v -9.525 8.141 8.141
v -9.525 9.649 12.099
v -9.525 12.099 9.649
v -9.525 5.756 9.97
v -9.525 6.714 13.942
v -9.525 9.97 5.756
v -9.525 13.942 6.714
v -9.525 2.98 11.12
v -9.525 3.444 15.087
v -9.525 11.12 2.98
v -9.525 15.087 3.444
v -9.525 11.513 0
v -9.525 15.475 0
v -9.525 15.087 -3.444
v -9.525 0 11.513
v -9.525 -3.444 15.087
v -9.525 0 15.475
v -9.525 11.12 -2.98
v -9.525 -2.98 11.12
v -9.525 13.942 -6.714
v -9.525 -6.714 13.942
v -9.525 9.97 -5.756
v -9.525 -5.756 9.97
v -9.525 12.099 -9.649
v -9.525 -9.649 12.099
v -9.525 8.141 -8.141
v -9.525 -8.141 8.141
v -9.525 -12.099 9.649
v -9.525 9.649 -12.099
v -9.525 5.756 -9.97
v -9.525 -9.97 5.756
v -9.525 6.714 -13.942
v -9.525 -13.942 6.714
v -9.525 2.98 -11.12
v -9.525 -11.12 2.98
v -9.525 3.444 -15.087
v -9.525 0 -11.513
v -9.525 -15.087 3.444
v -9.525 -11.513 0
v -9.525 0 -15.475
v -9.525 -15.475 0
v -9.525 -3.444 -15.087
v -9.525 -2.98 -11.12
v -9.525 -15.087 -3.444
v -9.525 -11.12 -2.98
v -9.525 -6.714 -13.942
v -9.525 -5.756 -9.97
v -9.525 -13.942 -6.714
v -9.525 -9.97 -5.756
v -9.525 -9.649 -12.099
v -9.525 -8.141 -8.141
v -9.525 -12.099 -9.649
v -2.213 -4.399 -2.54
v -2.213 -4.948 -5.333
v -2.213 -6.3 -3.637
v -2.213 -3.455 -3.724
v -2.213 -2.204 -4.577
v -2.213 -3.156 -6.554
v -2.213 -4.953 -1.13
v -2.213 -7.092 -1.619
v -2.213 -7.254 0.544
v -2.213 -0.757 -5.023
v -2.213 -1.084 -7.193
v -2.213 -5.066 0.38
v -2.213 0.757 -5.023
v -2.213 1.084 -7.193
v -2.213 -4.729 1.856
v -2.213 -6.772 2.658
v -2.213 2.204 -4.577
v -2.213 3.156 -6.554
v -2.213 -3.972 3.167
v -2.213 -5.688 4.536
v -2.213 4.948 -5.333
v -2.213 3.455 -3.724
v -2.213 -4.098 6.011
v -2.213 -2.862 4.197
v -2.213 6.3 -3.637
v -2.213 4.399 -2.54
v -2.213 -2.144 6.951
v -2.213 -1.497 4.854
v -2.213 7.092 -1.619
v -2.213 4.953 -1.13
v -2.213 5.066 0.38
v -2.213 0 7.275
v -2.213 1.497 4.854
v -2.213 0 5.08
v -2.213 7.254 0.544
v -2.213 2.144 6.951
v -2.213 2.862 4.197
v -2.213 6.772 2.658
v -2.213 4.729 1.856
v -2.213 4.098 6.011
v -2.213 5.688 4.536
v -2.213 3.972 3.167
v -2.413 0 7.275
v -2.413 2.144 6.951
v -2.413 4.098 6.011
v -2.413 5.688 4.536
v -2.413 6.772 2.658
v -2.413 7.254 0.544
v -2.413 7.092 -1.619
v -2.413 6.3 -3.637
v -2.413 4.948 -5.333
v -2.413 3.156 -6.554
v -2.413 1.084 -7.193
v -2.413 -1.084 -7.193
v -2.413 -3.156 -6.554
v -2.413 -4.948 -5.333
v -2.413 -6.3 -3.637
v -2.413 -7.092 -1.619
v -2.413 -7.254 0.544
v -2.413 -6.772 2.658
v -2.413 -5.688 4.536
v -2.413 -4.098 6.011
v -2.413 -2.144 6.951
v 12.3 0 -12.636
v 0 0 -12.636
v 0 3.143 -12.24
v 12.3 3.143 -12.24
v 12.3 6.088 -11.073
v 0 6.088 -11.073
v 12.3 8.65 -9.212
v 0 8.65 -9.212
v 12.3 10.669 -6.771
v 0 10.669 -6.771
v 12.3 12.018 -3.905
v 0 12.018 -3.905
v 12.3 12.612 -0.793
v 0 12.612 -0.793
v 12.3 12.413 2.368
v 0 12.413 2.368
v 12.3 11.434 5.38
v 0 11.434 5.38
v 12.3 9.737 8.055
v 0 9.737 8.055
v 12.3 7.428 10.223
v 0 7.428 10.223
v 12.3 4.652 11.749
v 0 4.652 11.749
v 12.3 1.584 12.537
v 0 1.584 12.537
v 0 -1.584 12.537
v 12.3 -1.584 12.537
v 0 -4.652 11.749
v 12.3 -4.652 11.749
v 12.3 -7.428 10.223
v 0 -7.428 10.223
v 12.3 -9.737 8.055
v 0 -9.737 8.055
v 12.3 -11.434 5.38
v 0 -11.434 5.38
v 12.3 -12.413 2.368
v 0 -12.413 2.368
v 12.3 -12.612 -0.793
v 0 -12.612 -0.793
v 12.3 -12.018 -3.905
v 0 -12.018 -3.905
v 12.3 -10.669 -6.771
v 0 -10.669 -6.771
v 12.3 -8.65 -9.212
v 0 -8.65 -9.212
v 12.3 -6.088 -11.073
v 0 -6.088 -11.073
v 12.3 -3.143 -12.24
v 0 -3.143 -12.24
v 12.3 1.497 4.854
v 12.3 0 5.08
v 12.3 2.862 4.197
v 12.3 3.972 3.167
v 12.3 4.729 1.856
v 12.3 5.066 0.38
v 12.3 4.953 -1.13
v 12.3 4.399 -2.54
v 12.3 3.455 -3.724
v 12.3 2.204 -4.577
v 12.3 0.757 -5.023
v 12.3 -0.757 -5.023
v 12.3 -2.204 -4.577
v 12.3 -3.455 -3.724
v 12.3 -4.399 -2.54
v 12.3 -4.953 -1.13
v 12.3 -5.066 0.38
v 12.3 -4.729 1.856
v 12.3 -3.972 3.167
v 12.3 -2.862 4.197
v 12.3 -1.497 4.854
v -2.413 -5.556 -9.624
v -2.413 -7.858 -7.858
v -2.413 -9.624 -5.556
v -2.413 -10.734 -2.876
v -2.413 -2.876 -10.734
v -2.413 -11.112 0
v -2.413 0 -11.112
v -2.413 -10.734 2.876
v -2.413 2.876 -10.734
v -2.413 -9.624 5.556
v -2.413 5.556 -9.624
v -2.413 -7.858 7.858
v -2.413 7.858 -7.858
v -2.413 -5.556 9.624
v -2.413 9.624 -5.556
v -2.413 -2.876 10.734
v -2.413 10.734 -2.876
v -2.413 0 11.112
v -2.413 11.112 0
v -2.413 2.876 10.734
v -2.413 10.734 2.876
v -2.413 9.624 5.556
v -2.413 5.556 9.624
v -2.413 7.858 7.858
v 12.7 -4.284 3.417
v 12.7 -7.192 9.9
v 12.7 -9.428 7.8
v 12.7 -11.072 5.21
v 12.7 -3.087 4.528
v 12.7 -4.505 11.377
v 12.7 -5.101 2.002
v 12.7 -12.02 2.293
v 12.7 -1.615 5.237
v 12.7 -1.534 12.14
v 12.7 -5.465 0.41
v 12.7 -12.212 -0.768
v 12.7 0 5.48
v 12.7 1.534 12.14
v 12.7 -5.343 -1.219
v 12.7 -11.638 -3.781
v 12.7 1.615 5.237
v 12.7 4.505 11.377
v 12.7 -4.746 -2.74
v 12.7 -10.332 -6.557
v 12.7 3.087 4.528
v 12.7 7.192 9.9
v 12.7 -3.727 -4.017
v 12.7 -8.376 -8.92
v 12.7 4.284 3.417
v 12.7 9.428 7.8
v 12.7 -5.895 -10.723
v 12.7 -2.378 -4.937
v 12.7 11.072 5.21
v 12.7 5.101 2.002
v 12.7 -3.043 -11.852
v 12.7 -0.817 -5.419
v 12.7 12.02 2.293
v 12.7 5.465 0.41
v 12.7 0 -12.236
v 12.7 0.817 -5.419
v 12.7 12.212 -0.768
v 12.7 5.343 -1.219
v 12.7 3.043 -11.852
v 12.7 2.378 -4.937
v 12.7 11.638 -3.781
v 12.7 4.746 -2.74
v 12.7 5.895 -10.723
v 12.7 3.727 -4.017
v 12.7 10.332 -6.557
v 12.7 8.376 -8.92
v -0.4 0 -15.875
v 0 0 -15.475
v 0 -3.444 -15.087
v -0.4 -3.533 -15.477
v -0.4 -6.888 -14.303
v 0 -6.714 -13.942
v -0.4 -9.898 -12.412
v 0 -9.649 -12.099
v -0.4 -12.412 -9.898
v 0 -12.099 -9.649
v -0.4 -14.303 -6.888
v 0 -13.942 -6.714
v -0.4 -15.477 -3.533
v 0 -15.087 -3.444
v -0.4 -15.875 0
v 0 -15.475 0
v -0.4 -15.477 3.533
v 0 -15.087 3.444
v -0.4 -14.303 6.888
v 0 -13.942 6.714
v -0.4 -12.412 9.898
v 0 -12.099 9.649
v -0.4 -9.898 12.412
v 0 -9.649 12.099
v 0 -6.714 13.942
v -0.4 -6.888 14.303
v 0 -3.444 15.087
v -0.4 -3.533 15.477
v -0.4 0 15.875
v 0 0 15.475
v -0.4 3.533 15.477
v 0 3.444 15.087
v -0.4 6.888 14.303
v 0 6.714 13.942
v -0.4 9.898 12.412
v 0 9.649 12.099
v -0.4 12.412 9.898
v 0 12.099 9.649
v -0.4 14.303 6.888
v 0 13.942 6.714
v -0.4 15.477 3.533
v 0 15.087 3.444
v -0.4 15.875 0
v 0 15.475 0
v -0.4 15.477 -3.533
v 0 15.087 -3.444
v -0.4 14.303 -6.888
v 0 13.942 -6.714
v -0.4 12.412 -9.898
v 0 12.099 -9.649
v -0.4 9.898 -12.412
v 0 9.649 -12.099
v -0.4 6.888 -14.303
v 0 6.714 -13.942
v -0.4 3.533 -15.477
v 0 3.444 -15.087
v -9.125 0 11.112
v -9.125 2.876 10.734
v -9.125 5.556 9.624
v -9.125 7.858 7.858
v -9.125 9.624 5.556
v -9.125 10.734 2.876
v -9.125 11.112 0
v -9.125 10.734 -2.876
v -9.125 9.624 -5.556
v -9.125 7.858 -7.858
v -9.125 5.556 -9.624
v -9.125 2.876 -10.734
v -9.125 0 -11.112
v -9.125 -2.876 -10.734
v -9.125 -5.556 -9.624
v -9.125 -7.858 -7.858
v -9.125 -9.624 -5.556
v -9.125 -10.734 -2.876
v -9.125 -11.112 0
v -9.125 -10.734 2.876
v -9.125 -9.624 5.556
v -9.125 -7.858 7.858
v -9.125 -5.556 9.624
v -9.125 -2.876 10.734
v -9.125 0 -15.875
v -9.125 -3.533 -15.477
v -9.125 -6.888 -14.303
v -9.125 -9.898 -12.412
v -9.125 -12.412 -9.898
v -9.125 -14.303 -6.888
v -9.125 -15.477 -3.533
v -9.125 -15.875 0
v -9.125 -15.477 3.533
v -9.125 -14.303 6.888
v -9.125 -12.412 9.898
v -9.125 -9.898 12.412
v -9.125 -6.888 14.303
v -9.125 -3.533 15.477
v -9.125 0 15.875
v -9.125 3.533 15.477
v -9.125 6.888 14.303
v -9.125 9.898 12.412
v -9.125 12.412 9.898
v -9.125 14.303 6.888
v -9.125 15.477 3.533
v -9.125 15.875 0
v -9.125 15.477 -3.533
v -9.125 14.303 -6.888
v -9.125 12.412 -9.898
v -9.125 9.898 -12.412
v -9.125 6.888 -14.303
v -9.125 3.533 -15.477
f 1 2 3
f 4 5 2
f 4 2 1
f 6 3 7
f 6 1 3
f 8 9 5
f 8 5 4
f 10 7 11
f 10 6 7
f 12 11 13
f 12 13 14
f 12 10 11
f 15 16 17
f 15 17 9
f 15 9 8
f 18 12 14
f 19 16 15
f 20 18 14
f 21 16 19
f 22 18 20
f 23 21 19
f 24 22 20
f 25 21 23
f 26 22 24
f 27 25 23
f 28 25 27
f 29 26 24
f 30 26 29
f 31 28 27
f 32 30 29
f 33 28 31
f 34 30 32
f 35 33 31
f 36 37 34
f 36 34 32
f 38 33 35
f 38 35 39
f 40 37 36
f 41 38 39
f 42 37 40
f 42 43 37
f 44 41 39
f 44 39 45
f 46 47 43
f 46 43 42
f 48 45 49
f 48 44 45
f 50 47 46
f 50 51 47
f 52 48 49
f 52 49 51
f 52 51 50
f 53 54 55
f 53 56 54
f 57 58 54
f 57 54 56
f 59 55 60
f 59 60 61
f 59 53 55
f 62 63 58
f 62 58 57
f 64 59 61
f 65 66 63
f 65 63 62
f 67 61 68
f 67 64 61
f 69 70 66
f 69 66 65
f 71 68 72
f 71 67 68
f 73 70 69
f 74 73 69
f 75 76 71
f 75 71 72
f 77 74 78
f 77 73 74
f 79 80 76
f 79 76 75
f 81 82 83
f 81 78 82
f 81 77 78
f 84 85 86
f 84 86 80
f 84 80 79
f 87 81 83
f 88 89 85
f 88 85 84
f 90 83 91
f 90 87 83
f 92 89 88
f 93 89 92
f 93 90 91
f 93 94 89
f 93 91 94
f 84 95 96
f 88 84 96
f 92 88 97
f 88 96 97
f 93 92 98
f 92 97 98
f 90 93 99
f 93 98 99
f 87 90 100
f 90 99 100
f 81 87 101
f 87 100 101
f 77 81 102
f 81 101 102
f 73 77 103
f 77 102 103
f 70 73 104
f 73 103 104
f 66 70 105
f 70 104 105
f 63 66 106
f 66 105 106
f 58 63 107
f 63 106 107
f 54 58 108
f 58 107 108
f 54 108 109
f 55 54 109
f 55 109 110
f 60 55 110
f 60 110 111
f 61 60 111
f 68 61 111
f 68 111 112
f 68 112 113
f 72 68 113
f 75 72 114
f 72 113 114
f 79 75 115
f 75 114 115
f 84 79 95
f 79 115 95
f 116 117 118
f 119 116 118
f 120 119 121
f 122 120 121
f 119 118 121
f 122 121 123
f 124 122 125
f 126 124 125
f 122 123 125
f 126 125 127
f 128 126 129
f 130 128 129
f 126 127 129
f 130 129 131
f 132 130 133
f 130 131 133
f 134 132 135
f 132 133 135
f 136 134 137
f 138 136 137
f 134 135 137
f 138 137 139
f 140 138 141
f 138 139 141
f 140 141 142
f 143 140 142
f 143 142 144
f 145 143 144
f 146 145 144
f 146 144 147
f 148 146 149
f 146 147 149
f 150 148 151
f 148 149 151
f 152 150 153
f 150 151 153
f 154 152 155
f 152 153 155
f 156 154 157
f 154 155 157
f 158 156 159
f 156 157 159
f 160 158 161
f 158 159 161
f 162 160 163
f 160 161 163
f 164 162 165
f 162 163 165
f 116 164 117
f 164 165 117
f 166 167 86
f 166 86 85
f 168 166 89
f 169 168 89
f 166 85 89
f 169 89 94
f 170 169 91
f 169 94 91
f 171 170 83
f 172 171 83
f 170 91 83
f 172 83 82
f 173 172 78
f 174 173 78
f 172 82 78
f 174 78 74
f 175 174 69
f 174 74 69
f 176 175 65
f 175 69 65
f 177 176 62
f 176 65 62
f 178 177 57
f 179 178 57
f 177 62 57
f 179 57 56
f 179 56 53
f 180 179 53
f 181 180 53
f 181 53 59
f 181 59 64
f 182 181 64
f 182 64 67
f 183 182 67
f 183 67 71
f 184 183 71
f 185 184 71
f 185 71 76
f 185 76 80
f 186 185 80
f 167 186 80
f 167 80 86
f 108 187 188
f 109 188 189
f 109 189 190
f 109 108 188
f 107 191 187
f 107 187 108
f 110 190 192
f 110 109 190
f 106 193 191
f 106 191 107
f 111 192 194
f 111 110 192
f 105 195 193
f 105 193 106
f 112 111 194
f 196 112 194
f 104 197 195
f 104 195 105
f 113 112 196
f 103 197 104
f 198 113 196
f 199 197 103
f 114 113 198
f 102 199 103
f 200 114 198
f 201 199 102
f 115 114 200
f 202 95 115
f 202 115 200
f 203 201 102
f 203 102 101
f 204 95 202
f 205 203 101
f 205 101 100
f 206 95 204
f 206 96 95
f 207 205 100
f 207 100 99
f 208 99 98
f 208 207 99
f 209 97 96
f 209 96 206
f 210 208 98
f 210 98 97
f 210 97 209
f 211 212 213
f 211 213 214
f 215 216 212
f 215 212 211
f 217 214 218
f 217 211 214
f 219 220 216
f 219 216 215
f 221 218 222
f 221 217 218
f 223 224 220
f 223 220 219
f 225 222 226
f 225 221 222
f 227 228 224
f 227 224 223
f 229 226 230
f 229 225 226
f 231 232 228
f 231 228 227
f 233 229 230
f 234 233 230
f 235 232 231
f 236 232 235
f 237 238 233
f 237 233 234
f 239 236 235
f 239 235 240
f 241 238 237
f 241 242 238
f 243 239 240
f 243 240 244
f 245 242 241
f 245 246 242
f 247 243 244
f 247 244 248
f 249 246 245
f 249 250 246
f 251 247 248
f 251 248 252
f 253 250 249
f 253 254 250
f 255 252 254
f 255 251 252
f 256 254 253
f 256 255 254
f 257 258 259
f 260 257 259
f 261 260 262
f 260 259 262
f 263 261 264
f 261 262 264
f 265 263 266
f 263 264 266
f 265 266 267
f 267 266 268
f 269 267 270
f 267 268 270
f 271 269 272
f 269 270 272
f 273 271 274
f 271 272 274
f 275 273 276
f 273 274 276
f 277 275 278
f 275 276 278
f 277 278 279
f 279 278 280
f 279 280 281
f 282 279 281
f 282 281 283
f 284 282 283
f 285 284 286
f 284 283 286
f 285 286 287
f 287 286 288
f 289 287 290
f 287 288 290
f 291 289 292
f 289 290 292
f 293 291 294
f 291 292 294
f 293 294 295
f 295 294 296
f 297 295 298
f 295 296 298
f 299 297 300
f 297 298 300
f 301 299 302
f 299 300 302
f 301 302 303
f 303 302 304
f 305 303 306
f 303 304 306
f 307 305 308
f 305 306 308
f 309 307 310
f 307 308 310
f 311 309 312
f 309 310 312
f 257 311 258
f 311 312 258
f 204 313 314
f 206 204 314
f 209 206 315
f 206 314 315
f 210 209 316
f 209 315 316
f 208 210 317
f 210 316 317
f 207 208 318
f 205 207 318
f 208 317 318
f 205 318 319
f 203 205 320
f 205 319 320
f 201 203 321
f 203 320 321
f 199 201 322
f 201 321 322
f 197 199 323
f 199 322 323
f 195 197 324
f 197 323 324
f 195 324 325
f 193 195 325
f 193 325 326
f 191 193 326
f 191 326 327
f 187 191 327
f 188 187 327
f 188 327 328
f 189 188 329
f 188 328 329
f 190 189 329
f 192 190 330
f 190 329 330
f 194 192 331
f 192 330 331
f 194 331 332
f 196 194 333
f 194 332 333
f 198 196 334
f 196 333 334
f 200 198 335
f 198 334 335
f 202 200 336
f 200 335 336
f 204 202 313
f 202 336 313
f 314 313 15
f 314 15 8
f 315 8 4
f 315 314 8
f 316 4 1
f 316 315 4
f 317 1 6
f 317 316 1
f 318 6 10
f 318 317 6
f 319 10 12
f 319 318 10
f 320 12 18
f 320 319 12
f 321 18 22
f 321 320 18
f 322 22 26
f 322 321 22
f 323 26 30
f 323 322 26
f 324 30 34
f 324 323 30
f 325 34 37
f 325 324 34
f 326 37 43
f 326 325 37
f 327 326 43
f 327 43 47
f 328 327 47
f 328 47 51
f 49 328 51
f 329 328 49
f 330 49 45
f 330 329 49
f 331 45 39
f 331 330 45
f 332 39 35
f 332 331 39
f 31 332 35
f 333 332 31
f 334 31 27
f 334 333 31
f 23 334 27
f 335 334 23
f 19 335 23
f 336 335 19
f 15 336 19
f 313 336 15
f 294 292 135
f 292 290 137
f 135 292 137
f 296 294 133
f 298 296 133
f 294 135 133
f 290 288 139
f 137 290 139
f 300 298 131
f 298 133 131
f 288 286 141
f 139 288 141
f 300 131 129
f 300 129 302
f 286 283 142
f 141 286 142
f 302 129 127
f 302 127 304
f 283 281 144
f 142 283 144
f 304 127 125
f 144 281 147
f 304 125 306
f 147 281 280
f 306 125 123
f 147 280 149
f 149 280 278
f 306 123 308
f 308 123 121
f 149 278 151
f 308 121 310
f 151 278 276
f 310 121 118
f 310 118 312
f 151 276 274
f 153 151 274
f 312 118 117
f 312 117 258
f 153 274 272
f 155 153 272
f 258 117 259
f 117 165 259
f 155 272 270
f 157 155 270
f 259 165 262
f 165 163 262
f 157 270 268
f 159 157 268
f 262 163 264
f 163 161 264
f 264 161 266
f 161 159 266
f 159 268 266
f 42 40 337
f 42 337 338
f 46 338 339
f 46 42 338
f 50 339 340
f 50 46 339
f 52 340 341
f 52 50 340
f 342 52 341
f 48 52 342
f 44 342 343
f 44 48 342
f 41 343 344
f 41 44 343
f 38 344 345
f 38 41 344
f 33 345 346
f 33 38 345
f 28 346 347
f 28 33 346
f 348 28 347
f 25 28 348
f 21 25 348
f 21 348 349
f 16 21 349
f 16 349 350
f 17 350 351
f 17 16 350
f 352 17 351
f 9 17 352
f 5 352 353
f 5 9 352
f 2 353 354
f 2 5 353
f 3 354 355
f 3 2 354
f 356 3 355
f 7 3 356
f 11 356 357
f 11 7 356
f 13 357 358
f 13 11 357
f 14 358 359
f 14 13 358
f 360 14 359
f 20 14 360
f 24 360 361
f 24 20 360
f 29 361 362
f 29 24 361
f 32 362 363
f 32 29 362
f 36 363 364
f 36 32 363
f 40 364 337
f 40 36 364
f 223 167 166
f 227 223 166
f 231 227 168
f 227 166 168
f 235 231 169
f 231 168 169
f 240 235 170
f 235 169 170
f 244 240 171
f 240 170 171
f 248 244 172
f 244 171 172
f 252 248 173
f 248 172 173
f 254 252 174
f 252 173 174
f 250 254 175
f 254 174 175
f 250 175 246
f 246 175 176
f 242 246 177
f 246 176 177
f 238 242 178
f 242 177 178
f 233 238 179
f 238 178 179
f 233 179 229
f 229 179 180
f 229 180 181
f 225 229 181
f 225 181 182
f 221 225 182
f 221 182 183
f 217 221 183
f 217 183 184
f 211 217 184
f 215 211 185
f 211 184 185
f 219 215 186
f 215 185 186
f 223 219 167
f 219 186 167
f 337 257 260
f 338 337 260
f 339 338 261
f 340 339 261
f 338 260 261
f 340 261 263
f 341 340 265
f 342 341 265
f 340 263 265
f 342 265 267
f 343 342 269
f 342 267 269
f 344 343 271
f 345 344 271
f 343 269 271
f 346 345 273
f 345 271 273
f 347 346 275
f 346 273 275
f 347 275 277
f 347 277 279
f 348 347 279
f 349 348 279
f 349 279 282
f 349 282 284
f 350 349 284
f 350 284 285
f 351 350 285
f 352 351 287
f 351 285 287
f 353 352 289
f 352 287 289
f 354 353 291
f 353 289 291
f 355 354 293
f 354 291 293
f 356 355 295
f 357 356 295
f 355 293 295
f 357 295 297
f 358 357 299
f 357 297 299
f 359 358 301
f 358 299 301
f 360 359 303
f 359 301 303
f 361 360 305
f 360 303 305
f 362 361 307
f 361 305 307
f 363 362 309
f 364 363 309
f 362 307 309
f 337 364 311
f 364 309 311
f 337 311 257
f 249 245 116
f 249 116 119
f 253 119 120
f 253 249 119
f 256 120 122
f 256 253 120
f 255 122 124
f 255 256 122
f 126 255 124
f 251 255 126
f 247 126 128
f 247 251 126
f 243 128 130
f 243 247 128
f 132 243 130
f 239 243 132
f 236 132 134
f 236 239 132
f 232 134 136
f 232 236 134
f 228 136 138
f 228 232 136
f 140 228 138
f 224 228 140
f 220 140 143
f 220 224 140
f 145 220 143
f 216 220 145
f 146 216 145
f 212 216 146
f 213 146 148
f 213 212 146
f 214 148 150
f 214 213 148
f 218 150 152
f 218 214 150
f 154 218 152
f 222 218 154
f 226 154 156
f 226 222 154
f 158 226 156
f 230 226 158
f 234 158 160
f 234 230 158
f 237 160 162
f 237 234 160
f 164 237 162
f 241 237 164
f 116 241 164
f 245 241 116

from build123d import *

# Parameters (mm, degrees)
SKETCH1_R           = 12.6365
BOSS_EXTRUDE1_DEPTH = 12.7
SKETCH2_R           = 15.875
BOSS_EXTRUDE2_DEPTH = 9.525
SKETCH3_R           = 11.1125
CUT_EXTRUDE1_DEPTH  = 7.112
SKETCH4_R           = 7.27458794
CUT_EXTRUDE2_DEPTH  = 0.2
SKETCH5_R           = 5.08
CUT_EXTRUDE3_DEPTH  = 27.952343479
CHAMFER1_SIZE       = 0.4


with BuildPart() as part:
    # Sketch1 → Boss-Extrude1 (new body)
    with BuildSketch(Plane(origin=(0, 0, 0), x_dir=(0, 0, -1), z_dir=(1, 0, 0))):
        Circle(SKETCH1_R)
    extrude(amount=BOSS_EXTRUDE1_DEPTH)

    # Sketch2 → Boss-Extrude2 (add)
    with BuildSketch(Plane.ZY):
        with Locations(Location((0, 0, 0), (0, 0, 180))):
            Circle(SKETCH2_R)
    extrude(amount=BOSS_EXTRUDE2_DEPTH)

    # Sketch3 → Cut-Extrude1 (cut)
    with BuildSketch(Plane.ZY.offset(9.525)):
        Circle(SKETCH3_R)
    extrude(amount=-CUT_EXTRUDE1_DEPTH, mode=Mode.SUBTRACT)

    # Sketch4 → Cut-Extrude2 (cut)
    with BuildSketch(Plane.ZY.offset(2.413)):
        Circle(SKETCH4_R)
    extrude(amount=-CUT_EXTRUDE2_DEPTH, mode=Mode.SUBTRACT)

    # Sketch5 → Cut-Extrude3 (cut, through all)
    with BuildSketch(Plane.ZY.offset(2.213)):
        Circle(SKETCH5_R)
    extrude(amount=-CUT_EXTRUDE3_DEPTH, mode=Mode.SUBTRACT)

    # Chamfer1
    chamfer1_edges = [part.edges().sort_by_distance(p)[0] for p in [
        (-9.525, 0, -11.1125),
        (12.7, 0, -5.08),
        (12.7, 0, 12.6365),
        (0, 0, 15.875),
        (-9.525, 0, 15.875),
    ]]
    chamfer(chamfer1_edges, length=CHAMFER1_SIZE)


solid = part.part
